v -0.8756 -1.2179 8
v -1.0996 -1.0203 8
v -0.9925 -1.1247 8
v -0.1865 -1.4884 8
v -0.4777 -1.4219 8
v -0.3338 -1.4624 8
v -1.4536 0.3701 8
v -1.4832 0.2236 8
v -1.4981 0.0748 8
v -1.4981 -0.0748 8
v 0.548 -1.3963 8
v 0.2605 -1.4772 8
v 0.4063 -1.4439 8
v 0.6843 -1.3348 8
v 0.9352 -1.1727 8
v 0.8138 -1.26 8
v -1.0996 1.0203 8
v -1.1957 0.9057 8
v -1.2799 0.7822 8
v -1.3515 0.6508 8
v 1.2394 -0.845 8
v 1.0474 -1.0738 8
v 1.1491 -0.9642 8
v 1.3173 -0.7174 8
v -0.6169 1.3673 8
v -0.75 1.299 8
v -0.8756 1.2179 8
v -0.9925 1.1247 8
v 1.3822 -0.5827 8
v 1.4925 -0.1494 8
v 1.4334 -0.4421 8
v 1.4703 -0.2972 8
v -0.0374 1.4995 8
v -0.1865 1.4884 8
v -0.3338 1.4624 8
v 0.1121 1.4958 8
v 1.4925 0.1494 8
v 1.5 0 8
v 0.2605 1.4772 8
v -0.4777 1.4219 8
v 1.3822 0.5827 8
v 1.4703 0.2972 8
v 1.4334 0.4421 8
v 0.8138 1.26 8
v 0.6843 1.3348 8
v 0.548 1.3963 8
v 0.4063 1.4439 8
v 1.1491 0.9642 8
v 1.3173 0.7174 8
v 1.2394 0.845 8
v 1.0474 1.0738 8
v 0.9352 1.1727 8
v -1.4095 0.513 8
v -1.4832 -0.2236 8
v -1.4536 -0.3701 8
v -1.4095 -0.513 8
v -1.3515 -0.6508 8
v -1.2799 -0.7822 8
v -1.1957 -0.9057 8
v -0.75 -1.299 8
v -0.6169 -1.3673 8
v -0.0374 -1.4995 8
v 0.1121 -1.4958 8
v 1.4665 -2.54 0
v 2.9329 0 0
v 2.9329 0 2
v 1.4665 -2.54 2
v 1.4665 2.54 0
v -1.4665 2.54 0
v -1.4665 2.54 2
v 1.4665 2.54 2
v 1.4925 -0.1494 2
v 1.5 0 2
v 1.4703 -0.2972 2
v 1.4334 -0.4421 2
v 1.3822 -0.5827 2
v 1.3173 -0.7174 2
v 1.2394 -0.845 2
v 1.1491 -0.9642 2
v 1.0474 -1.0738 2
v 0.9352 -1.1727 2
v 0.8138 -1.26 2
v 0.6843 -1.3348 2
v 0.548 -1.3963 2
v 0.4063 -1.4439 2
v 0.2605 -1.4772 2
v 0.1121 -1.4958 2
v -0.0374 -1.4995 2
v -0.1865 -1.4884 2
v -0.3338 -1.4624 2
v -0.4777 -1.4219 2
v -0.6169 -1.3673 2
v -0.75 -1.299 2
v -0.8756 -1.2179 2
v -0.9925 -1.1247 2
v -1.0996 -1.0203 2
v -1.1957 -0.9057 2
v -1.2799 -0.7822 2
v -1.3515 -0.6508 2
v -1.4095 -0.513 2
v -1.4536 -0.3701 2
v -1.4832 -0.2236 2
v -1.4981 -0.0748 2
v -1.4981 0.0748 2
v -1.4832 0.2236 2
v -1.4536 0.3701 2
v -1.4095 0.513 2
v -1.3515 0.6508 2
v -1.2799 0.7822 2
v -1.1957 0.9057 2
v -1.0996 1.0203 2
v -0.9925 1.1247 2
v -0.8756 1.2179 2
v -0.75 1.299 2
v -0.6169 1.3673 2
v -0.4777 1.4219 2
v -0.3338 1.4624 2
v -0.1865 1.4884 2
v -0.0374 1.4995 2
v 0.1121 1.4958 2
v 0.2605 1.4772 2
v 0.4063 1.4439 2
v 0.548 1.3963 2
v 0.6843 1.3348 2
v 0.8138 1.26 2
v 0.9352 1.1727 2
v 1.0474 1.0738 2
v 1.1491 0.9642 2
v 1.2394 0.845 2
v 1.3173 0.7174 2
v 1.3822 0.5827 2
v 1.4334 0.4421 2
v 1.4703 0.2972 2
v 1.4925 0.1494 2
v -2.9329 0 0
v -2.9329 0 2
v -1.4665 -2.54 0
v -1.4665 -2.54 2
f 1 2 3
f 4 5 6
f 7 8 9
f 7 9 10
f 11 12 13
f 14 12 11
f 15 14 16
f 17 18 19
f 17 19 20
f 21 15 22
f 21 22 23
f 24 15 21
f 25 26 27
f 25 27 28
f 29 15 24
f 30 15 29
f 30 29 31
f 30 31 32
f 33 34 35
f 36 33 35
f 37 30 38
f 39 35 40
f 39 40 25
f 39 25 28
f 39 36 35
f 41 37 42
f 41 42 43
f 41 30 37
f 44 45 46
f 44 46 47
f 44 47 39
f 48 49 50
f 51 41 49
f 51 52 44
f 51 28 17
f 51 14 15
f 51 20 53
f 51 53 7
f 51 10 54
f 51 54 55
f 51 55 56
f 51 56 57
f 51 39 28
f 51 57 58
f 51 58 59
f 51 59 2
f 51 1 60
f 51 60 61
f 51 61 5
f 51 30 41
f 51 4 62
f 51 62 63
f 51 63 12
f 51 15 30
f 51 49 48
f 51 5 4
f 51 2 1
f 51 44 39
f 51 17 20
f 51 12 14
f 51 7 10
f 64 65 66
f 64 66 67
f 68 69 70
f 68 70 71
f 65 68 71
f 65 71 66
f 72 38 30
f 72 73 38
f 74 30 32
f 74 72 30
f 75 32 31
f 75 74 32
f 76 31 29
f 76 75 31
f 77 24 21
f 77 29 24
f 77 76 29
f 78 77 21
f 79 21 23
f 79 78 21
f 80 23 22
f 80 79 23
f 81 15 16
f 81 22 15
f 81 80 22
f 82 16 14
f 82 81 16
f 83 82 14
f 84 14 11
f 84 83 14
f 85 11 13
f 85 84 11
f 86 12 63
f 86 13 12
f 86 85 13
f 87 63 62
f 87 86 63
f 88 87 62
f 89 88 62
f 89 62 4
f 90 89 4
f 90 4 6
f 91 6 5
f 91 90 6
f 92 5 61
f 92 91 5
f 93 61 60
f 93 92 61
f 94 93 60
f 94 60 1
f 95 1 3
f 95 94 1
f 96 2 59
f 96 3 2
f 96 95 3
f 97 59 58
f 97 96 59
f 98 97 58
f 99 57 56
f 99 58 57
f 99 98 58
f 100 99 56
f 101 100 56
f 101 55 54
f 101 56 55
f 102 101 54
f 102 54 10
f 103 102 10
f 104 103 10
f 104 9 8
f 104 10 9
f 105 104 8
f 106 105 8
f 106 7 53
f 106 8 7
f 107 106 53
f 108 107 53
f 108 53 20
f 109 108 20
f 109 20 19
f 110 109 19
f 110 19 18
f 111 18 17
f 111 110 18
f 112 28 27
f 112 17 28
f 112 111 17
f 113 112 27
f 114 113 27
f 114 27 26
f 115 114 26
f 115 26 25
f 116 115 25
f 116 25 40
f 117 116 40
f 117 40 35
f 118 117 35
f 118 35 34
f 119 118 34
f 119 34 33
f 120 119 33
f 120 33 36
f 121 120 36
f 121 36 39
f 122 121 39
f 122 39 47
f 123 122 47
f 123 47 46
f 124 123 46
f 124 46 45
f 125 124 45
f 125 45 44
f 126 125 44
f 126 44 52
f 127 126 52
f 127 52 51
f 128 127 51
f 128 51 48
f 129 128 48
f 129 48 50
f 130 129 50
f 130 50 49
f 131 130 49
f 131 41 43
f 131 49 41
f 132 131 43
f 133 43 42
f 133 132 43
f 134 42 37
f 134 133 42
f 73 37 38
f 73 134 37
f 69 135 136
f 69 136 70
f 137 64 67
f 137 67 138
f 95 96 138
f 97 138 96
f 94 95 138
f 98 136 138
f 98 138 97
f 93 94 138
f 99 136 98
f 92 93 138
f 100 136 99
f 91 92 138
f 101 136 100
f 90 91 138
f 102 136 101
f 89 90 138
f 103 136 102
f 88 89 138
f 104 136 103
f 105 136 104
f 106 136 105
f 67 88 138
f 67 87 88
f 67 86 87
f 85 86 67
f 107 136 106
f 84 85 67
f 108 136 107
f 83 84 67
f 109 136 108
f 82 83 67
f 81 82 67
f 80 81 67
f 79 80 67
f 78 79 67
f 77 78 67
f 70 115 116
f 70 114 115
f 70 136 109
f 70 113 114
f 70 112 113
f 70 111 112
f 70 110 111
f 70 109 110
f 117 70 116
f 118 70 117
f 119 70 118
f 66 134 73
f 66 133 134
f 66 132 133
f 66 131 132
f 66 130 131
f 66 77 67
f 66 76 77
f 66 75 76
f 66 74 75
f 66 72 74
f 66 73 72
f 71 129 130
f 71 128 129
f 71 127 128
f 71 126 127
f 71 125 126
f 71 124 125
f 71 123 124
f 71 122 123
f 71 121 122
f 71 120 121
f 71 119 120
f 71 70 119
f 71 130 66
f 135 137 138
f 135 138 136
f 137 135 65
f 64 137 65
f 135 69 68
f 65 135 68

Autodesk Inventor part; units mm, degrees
ref_plane "YZ Plane" through (0, 0, 0) normal (1, 0, 0) x (0, 1, 0)
ref_plane "XZ Plane" through (0, 0, 0) normal (0, 1, 0) x (-1, 0, 0)
ref_plane "XY Plane" through (0, 0, 0) normal (0, 0, 1) x (1, 0, 0)
sketch "Sketch1" plane through (0, 0, 0) normal (0, 0, 1) x (1, 0, 0)
  line L0 (1.4665, -2.54) -> (-1.4665, -2.54)
  line L1 (-1.4665, -2.54) -> (-2.9329, 0)
  line L2 (-2.9329, 0) -> (-1.4665, 2.54)
  line L3 (-1.4665, 2.54) -> (1.4665, 2.54)
  line L4 (1.4665, 2.54) -> (2.9329, 0)
  line L5 (2.9329, 0) -> (1.4665, -2.54)
  point P0 (0, 0)
  point P1 (0, 0)
  point P2 (0, -2.54)
  dimension "d1" = 2.54
  dimension "d2" = 2.54
extrude "Extrusion1" add sketch "Sketch1" along normal blind 2
sketch "Sketch2" plane through (0, 0, 2) normal (0, 0, 1) x (1, 0, 0)
  circle A0 centre (0, 0) radius 1.5
  dimension "d5" = 3
extrude "Extrusion2" add sketch "Sketch2" along normal blind 6
thread "Thread1" size "M3x0.5" class "6g" standard "ANSI Metric M Profile" full length
properties part number "M3 screw_6mm"
